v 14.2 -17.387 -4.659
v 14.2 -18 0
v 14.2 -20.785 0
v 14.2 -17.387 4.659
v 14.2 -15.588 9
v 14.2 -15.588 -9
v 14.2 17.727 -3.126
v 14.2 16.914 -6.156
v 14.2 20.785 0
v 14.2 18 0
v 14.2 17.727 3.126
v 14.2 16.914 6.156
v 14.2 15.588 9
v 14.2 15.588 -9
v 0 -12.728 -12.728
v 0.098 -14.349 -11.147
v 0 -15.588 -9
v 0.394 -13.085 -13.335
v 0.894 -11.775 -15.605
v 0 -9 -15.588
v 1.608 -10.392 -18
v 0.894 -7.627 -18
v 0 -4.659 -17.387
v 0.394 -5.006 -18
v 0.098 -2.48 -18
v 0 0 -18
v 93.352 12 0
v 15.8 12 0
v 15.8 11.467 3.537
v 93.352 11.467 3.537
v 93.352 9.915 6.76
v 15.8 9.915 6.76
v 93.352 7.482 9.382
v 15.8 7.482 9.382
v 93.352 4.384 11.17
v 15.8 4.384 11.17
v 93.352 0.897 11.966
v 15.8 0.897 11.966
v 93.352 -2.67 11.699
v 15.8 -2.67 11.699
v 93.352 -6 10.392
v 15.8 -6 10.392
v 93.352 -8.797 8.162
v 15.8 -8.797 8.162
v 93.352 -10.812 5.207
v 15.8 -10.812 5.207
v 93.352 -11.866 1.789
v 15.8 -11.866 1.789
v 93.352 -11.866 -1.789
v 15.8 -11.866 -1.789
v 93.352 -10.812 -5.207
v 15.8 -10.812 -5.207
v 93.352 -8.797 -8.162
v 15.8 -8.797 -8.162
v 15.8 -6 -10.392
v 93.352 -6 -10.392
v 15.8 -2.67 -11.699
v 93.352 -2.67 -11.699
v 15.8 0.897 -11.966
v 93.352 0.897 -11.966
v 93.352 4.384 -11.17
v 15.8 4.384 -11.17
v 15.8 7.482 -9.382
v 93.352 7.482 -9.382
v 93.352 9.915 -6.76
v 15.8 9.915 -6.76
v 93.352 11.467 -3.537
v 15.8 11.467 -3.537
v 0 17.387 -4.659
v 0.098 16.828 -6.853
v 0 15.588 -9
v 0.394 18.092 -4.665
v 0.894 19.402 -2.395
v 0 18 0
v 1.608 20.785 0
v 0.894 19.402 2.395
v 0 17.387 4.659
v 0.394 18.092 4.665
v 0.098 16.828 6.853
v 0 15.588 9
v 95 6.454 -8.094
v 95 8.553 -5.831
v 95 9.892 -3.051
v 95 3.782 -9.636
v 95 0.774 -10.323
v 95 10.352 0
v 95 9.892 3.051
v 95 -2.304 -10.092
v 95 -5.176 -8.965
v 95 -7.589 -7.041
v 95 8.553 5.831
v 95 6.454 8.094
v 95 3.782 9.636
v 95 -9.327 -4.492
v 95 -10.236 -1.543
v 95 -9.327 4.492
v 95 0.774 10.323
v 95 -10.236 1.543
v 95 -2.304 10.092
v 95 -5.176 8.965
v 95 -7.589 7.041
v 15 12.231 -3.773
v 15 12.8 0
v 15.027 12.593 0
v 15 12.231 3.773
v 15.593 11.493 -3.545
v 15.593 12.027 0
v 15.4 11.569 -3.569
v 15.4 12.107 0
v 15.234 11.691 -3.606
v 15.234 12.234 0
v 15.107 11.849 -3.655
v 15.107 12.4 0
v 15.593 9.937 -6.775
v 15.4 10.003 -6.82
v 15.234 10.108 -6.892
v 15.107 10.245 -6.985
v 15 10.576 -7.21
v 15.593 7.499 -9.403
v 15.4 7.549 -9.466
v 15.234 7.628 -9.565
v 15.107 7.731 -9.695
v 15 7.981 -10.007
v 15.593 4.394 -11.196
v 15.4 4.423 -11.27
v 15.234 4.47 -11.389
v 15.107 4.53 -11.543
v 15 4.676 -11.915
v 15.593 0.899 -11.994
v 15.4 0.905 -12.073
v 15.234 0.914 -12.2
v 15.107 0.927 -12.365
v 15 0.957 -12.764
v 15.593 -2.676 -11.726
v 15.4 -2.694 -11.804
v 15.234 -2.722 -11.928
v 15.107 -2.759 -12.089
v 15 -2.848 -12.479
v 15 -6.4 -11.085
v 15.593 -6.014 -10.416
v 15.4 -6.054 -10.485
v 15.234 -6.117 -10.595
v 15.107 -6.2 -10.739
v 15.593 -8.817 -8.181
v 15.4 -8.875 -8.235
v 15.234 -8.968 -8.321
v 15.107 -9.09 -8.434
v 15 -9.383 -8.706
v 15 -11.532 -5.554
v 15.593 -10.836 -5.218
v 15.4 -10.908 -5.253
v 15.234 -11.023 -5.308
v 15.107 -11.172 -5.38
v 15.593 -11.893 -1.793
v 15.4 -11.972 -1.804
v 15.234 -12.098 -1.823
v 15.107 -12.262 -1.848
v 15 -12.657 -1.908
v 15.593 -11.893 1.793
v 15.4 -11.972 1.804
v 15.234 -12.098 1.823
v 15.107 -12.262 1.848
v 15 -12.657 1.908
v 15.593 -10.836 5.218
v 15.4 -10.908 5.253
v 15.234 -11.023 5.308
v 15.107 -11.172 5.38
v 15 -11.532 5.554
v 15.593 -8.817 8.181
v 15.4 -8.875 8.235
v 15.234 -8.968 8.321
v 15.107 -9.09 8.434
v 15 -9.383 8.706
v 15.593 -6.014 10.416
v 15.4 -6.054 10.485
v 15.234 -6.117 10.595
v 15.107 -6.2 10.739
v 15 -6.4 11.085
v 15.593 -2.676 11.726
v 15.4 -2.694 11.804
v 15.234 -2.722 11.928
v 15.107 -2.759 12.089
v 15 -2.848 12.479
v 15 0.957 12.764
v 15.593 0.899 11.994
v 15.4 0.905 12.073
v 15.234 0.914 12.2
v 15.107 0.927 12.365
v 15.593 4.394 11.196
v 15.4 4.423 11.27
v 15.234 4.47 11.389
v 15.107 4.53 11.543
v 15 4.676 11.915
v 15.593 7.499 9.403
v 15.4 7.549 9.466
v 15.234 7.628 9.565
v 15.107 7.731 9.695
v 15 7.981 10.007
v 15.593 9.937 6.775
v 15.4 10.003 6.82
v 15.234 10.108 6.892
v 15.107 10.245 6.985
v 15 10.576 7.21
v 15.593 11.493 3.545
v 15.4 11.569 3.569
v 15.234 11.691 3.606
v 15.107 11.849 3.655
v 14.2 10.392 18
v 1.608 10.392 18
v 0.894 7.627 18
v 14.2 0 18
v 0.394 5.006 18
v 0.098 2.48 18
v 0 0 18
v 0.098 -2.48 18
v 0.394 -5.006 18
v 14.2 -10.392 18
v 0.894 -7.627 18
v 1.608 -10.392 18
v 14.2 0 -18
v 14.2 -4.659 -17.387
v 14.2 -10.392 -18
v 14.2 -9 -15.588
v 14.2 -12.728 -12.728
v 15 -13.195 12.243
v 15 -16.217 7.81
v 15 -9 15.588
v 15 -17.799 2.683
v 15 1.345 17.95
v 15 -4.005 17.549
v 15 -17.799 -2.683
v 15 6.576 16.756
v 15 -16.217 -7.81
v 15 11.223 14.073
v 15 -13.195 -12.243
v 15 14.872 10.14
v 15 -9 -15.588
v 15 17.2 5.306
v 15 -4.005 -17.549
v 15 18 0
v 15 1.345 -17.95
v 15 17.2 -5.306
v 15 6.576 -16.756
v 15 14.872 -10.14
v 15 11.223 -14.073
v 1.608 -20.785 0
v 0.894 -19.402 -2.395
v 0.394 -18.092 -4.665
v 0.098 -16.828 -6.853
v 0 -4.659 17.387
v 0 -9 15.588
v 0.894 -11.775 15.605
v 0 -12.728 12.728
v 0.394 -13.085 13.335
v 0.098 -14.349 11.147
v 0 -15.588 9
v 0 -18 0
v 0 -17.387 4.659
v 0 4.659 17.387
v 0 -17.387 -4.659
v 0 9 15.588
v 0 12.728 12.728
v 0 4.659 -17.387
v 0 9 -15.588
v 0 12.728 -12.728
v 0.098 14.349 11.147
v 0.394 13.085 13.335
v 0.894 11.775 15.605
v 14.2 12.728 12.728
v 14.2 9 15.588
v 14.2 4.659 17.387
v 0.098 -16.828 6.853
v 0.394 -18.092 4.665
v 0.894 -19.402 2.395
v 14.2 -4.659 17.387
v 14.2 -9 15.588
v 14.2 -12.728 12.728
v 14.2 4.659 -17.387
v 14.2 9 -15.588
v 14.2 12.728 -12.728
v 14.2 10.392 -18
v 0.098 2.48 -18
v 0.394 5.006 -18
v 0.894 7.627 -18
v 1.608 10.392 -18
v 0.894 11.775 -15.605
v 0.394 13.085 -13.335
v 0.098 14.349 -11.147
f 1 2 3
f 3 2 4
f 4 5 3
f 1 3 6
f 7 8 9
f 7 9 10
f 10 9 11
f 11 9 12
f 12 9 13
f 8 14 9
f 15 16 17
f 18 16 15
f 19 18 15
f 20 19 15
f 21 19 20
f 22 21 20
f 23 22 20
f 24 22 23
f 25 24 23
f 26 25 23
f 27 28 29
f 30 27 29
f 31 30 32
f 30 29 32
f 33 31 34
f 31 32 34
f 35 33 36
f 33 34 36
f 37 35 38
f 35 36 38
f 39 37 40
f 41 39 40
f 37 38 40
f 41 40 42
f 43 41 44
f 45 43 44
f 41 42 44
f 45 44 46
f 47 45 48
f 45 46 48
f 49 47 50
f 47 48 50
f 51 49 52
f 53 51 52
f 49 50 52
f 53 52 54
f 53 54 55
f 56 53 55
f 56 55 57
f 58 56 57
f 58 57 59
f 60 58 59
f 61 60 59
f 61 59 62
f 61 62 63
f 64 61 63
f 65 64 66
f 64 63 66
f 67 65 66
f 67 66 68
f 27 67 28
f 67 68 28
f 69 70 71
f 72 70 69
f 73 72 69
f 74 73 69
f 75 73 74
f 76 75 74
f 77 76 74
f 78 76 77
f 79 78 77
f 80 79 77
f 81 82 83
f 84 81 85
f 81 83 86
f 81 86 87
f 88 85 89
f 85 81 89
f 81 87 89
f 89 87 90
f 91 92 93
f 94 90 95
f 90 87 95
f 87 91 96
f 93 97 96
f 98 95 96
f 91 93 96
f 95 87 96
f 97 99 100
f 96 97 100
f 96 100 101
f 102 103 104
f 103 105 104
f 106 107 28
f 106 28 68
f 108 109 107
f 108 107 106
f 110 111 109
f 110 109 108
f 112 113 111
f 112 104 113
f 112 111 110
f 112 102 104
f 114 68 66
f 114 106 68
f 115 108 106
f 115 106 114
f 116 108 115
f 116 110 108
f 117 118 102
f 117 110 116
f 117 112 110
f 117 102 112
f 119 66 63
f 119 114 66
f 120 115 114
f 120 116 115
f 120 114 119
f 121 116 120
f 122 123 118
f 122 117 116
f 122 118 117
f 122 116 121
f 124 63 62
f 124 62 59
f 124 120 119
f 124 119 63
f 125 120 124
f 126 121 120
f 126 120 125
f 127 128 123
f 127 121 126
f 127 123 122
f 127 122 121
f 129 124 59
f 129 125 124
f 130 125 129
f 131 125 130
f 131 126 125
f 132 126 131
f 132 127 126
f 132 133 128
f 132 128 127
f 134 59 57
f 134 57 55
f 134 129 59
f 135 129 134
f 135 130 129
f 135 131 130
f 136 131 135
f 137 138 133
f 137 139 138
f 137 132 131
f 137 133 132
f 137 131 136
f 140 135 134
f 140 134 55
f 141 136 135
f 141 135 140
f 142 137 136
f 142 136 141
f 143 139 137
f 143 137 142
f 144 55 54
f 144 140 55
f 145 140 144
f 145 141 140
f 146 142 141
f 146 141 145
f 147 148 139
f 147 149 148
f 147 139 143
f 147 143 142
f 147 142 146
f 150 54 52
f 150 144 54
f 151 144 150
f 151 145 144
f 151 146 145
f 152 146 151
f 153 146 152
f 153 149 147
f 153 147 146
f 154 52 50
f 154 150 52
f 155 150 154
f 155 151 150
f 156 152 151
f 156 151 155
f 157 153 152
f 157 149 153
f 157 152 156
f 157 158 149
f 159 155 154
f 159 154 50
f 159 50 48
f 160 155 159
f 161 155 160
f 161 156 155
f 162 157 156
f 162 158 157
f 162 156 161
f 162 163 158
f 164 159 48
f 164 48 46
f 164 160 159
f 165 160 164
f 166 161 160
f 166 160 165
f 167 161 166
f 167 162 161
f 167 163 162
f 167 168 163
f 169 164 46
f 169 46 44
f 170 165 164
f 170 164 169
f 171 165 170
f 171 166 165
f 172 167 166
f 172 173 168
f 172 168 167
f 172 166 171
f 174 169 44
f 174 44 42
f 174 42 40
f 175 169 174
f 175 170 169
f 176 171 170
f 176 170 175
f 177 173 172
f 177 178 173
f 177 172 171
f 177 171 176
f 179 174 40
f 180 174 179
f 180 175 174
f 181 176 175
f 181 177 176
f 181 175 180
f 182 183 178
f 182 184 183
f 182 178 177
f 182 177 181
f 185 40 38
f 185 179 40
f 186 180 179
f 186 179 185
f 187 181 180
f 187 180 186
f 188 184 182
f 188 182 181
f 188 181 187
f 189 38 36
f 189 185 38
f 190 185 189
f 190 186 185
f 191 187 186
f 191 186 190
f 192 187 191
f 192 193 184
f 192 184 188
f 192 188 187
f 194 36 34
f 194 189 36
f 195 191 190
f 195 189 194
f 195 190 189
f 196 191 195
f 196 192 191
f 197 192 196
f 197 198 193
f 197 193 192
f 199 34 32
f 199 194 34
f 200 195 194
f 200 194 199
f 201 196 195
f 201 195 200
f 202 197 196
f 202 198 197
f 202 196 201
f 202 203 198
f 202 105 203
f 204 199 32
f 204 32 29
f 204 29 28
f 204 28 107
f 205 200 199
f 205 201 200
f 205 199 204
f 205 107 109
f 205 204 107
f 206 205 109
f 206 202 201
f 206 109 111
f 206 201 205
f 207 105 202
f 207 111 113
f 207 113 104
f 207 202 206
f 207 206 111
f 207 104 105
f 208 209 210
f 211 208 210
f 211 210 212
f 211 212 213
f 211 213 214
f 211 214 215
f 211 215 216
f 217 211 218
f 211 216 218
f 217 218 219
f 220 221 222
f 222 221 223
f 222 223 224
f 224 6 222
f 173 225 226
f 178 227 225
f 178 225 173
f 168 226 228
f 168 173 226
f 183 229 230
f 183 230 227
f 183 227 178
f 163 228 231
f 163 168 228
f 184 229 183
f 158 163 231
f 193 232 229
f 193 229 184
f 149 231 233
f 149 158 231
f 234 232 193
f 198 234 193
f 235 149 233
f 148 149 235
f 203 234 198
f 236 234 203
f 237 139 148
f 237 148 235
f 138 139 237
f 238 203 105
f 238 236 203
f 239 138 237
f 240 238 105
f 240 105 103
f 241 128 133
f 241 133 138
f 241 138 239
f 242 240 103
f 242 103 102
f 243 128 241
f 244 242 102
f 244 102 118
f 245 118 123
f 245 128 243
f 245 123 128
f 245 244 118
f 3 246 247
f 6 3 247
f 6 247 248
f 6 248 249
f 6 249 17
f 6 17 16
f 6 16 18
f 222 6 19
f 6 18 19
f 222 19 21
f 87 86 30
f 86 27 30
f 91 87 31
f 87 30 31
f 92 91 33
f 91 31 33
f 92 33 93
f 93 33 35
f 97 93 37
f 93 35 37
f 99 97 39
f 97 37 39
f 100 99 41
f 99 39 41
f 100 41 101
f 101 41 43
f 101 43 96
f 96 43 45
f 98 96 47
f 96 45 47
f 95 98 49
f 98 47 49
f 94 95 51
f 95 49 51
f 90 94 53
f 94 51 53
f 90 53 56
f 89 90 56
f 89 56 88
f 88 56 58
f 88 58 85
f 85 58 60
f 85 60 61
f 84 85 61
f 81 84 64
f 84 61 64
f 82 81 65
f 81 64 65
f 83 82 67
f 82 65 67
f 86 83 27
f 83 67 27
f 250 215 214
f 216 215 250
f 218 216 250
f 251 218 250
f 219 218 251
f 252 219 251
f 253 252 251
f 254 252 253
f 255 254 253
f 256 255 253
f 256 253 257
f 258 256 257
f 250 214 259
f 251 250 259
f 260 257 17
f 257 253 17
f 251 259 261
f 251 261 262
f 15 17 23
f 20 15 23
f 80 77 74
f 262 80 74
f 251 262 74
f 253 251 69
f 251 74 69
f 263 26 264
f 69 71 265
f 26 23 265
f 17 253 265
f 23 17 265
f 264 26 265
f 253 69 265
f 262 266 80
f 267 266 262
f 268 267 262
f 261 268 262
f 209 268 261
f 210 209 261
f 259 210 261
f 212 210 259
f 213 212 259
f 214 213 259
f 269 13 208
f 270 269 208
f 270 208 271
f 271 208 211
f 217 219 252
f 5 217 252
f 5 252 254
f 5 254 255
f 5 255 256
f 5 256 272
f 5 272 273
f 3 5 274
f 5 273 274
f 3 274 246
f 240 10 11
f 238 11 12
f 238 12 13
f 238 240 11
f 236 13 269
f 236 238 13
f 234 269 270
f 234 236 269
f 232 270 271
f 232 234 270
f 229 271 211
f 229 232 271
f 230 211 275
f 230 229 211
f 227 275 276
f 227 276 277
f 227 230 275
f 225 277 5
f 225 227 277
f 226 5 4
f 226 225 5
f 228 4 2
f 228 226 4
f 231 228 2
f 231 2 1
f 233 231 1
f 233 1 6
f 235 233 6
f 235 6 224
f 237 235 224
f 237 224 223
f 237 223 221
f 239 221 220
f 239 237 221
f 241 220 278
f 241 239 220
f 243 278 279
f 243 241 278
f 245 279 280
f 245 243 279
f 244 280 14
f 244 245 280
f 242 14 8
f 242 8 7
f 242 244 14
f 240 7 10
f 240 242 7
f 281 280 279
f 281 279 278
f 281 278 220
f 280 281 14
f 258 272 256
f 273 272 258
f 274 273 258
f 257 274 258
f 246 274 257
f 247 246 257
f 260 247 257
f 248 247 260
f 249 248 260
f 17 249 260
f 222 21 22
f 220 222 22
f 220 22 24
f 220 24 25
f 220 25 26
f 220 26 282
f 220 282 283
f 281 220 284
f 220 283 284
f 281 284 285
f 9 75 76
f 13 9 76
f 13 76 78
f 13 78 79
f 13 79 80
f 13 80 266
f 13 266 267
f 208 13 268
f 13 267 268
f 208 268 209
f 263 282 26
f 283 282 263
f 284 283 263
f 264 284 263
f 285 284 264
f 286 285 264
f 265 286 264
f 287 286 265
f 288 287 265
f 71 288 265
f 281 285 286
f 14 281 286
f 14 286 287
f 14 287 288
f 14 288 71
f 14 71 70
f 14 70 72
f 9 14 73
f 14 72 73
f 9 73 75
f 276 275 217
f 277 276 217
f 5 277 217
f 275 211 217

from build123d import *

# Parameters (mm, degrees)
BASEHEAD_DEPTH   = 15
BEARINGFACESKE_W = 0.8
BEARINGFACESKE_H = 2.784609691
FILLET_2_R       = 0.8


with BuildPart() as part:
    # BaseHeadSke → BaseHead (new body)
    with BuildSketch(Plane(origin=(0, 0, 0), x_dir=(0, 0, -1), z_dir=(1, 0, 0))):
        Polygon((18, 10.392304845), (0, 20.784609691), (-18, 10.392304845), (-18, -10.392304845), (0, -20.784609691), (18, -10.392304845), align=None)
    extrude(amount=BASEHEAD_DEPTH)

    # BodySke → BaseBody (revolve)
    with BuildSketch(Plane.XY):
        Polygon((0, 0), (95, 0), (95, 10.352), (93.352, 12), (0, 12), align=None)
    revolve(axis=Axis((0, 0, 0), (1, 0, 0)))

    # HeadChamferSke → HeadChamfer (revolve, cut)
    with BuildSketch(Plane.XY):
        Polygon((1.607695155, 20.784609691), (0, 20.784609691), (0, 18), align=None)
    revolve(axis=Axis((0, 0, 0), (1, 0, 0)), mode=Mode.SUBTRACT)

    # BearingFaceSke → BearingFace (revolve, cut)
    with BuildSketch(Plane.XY):
        with Locations((14.6, 19.392304845)):
            Rectangle(BEARINGFACESKE_W, BEARINGFACESKE_H)
    revolve(axis=Axis((0, 0, 0), (1, 0, 0)), mode=Mode.SUBTRACT)

    # Fillet 2
    fillet_2_edges = [part.edges().sort_by_distance(p)[0] for p in [
        (15, -12, 0),
    ]]
    fillet(fillet_2_edges, radius=FILLET_2_R)


solid = part.part
